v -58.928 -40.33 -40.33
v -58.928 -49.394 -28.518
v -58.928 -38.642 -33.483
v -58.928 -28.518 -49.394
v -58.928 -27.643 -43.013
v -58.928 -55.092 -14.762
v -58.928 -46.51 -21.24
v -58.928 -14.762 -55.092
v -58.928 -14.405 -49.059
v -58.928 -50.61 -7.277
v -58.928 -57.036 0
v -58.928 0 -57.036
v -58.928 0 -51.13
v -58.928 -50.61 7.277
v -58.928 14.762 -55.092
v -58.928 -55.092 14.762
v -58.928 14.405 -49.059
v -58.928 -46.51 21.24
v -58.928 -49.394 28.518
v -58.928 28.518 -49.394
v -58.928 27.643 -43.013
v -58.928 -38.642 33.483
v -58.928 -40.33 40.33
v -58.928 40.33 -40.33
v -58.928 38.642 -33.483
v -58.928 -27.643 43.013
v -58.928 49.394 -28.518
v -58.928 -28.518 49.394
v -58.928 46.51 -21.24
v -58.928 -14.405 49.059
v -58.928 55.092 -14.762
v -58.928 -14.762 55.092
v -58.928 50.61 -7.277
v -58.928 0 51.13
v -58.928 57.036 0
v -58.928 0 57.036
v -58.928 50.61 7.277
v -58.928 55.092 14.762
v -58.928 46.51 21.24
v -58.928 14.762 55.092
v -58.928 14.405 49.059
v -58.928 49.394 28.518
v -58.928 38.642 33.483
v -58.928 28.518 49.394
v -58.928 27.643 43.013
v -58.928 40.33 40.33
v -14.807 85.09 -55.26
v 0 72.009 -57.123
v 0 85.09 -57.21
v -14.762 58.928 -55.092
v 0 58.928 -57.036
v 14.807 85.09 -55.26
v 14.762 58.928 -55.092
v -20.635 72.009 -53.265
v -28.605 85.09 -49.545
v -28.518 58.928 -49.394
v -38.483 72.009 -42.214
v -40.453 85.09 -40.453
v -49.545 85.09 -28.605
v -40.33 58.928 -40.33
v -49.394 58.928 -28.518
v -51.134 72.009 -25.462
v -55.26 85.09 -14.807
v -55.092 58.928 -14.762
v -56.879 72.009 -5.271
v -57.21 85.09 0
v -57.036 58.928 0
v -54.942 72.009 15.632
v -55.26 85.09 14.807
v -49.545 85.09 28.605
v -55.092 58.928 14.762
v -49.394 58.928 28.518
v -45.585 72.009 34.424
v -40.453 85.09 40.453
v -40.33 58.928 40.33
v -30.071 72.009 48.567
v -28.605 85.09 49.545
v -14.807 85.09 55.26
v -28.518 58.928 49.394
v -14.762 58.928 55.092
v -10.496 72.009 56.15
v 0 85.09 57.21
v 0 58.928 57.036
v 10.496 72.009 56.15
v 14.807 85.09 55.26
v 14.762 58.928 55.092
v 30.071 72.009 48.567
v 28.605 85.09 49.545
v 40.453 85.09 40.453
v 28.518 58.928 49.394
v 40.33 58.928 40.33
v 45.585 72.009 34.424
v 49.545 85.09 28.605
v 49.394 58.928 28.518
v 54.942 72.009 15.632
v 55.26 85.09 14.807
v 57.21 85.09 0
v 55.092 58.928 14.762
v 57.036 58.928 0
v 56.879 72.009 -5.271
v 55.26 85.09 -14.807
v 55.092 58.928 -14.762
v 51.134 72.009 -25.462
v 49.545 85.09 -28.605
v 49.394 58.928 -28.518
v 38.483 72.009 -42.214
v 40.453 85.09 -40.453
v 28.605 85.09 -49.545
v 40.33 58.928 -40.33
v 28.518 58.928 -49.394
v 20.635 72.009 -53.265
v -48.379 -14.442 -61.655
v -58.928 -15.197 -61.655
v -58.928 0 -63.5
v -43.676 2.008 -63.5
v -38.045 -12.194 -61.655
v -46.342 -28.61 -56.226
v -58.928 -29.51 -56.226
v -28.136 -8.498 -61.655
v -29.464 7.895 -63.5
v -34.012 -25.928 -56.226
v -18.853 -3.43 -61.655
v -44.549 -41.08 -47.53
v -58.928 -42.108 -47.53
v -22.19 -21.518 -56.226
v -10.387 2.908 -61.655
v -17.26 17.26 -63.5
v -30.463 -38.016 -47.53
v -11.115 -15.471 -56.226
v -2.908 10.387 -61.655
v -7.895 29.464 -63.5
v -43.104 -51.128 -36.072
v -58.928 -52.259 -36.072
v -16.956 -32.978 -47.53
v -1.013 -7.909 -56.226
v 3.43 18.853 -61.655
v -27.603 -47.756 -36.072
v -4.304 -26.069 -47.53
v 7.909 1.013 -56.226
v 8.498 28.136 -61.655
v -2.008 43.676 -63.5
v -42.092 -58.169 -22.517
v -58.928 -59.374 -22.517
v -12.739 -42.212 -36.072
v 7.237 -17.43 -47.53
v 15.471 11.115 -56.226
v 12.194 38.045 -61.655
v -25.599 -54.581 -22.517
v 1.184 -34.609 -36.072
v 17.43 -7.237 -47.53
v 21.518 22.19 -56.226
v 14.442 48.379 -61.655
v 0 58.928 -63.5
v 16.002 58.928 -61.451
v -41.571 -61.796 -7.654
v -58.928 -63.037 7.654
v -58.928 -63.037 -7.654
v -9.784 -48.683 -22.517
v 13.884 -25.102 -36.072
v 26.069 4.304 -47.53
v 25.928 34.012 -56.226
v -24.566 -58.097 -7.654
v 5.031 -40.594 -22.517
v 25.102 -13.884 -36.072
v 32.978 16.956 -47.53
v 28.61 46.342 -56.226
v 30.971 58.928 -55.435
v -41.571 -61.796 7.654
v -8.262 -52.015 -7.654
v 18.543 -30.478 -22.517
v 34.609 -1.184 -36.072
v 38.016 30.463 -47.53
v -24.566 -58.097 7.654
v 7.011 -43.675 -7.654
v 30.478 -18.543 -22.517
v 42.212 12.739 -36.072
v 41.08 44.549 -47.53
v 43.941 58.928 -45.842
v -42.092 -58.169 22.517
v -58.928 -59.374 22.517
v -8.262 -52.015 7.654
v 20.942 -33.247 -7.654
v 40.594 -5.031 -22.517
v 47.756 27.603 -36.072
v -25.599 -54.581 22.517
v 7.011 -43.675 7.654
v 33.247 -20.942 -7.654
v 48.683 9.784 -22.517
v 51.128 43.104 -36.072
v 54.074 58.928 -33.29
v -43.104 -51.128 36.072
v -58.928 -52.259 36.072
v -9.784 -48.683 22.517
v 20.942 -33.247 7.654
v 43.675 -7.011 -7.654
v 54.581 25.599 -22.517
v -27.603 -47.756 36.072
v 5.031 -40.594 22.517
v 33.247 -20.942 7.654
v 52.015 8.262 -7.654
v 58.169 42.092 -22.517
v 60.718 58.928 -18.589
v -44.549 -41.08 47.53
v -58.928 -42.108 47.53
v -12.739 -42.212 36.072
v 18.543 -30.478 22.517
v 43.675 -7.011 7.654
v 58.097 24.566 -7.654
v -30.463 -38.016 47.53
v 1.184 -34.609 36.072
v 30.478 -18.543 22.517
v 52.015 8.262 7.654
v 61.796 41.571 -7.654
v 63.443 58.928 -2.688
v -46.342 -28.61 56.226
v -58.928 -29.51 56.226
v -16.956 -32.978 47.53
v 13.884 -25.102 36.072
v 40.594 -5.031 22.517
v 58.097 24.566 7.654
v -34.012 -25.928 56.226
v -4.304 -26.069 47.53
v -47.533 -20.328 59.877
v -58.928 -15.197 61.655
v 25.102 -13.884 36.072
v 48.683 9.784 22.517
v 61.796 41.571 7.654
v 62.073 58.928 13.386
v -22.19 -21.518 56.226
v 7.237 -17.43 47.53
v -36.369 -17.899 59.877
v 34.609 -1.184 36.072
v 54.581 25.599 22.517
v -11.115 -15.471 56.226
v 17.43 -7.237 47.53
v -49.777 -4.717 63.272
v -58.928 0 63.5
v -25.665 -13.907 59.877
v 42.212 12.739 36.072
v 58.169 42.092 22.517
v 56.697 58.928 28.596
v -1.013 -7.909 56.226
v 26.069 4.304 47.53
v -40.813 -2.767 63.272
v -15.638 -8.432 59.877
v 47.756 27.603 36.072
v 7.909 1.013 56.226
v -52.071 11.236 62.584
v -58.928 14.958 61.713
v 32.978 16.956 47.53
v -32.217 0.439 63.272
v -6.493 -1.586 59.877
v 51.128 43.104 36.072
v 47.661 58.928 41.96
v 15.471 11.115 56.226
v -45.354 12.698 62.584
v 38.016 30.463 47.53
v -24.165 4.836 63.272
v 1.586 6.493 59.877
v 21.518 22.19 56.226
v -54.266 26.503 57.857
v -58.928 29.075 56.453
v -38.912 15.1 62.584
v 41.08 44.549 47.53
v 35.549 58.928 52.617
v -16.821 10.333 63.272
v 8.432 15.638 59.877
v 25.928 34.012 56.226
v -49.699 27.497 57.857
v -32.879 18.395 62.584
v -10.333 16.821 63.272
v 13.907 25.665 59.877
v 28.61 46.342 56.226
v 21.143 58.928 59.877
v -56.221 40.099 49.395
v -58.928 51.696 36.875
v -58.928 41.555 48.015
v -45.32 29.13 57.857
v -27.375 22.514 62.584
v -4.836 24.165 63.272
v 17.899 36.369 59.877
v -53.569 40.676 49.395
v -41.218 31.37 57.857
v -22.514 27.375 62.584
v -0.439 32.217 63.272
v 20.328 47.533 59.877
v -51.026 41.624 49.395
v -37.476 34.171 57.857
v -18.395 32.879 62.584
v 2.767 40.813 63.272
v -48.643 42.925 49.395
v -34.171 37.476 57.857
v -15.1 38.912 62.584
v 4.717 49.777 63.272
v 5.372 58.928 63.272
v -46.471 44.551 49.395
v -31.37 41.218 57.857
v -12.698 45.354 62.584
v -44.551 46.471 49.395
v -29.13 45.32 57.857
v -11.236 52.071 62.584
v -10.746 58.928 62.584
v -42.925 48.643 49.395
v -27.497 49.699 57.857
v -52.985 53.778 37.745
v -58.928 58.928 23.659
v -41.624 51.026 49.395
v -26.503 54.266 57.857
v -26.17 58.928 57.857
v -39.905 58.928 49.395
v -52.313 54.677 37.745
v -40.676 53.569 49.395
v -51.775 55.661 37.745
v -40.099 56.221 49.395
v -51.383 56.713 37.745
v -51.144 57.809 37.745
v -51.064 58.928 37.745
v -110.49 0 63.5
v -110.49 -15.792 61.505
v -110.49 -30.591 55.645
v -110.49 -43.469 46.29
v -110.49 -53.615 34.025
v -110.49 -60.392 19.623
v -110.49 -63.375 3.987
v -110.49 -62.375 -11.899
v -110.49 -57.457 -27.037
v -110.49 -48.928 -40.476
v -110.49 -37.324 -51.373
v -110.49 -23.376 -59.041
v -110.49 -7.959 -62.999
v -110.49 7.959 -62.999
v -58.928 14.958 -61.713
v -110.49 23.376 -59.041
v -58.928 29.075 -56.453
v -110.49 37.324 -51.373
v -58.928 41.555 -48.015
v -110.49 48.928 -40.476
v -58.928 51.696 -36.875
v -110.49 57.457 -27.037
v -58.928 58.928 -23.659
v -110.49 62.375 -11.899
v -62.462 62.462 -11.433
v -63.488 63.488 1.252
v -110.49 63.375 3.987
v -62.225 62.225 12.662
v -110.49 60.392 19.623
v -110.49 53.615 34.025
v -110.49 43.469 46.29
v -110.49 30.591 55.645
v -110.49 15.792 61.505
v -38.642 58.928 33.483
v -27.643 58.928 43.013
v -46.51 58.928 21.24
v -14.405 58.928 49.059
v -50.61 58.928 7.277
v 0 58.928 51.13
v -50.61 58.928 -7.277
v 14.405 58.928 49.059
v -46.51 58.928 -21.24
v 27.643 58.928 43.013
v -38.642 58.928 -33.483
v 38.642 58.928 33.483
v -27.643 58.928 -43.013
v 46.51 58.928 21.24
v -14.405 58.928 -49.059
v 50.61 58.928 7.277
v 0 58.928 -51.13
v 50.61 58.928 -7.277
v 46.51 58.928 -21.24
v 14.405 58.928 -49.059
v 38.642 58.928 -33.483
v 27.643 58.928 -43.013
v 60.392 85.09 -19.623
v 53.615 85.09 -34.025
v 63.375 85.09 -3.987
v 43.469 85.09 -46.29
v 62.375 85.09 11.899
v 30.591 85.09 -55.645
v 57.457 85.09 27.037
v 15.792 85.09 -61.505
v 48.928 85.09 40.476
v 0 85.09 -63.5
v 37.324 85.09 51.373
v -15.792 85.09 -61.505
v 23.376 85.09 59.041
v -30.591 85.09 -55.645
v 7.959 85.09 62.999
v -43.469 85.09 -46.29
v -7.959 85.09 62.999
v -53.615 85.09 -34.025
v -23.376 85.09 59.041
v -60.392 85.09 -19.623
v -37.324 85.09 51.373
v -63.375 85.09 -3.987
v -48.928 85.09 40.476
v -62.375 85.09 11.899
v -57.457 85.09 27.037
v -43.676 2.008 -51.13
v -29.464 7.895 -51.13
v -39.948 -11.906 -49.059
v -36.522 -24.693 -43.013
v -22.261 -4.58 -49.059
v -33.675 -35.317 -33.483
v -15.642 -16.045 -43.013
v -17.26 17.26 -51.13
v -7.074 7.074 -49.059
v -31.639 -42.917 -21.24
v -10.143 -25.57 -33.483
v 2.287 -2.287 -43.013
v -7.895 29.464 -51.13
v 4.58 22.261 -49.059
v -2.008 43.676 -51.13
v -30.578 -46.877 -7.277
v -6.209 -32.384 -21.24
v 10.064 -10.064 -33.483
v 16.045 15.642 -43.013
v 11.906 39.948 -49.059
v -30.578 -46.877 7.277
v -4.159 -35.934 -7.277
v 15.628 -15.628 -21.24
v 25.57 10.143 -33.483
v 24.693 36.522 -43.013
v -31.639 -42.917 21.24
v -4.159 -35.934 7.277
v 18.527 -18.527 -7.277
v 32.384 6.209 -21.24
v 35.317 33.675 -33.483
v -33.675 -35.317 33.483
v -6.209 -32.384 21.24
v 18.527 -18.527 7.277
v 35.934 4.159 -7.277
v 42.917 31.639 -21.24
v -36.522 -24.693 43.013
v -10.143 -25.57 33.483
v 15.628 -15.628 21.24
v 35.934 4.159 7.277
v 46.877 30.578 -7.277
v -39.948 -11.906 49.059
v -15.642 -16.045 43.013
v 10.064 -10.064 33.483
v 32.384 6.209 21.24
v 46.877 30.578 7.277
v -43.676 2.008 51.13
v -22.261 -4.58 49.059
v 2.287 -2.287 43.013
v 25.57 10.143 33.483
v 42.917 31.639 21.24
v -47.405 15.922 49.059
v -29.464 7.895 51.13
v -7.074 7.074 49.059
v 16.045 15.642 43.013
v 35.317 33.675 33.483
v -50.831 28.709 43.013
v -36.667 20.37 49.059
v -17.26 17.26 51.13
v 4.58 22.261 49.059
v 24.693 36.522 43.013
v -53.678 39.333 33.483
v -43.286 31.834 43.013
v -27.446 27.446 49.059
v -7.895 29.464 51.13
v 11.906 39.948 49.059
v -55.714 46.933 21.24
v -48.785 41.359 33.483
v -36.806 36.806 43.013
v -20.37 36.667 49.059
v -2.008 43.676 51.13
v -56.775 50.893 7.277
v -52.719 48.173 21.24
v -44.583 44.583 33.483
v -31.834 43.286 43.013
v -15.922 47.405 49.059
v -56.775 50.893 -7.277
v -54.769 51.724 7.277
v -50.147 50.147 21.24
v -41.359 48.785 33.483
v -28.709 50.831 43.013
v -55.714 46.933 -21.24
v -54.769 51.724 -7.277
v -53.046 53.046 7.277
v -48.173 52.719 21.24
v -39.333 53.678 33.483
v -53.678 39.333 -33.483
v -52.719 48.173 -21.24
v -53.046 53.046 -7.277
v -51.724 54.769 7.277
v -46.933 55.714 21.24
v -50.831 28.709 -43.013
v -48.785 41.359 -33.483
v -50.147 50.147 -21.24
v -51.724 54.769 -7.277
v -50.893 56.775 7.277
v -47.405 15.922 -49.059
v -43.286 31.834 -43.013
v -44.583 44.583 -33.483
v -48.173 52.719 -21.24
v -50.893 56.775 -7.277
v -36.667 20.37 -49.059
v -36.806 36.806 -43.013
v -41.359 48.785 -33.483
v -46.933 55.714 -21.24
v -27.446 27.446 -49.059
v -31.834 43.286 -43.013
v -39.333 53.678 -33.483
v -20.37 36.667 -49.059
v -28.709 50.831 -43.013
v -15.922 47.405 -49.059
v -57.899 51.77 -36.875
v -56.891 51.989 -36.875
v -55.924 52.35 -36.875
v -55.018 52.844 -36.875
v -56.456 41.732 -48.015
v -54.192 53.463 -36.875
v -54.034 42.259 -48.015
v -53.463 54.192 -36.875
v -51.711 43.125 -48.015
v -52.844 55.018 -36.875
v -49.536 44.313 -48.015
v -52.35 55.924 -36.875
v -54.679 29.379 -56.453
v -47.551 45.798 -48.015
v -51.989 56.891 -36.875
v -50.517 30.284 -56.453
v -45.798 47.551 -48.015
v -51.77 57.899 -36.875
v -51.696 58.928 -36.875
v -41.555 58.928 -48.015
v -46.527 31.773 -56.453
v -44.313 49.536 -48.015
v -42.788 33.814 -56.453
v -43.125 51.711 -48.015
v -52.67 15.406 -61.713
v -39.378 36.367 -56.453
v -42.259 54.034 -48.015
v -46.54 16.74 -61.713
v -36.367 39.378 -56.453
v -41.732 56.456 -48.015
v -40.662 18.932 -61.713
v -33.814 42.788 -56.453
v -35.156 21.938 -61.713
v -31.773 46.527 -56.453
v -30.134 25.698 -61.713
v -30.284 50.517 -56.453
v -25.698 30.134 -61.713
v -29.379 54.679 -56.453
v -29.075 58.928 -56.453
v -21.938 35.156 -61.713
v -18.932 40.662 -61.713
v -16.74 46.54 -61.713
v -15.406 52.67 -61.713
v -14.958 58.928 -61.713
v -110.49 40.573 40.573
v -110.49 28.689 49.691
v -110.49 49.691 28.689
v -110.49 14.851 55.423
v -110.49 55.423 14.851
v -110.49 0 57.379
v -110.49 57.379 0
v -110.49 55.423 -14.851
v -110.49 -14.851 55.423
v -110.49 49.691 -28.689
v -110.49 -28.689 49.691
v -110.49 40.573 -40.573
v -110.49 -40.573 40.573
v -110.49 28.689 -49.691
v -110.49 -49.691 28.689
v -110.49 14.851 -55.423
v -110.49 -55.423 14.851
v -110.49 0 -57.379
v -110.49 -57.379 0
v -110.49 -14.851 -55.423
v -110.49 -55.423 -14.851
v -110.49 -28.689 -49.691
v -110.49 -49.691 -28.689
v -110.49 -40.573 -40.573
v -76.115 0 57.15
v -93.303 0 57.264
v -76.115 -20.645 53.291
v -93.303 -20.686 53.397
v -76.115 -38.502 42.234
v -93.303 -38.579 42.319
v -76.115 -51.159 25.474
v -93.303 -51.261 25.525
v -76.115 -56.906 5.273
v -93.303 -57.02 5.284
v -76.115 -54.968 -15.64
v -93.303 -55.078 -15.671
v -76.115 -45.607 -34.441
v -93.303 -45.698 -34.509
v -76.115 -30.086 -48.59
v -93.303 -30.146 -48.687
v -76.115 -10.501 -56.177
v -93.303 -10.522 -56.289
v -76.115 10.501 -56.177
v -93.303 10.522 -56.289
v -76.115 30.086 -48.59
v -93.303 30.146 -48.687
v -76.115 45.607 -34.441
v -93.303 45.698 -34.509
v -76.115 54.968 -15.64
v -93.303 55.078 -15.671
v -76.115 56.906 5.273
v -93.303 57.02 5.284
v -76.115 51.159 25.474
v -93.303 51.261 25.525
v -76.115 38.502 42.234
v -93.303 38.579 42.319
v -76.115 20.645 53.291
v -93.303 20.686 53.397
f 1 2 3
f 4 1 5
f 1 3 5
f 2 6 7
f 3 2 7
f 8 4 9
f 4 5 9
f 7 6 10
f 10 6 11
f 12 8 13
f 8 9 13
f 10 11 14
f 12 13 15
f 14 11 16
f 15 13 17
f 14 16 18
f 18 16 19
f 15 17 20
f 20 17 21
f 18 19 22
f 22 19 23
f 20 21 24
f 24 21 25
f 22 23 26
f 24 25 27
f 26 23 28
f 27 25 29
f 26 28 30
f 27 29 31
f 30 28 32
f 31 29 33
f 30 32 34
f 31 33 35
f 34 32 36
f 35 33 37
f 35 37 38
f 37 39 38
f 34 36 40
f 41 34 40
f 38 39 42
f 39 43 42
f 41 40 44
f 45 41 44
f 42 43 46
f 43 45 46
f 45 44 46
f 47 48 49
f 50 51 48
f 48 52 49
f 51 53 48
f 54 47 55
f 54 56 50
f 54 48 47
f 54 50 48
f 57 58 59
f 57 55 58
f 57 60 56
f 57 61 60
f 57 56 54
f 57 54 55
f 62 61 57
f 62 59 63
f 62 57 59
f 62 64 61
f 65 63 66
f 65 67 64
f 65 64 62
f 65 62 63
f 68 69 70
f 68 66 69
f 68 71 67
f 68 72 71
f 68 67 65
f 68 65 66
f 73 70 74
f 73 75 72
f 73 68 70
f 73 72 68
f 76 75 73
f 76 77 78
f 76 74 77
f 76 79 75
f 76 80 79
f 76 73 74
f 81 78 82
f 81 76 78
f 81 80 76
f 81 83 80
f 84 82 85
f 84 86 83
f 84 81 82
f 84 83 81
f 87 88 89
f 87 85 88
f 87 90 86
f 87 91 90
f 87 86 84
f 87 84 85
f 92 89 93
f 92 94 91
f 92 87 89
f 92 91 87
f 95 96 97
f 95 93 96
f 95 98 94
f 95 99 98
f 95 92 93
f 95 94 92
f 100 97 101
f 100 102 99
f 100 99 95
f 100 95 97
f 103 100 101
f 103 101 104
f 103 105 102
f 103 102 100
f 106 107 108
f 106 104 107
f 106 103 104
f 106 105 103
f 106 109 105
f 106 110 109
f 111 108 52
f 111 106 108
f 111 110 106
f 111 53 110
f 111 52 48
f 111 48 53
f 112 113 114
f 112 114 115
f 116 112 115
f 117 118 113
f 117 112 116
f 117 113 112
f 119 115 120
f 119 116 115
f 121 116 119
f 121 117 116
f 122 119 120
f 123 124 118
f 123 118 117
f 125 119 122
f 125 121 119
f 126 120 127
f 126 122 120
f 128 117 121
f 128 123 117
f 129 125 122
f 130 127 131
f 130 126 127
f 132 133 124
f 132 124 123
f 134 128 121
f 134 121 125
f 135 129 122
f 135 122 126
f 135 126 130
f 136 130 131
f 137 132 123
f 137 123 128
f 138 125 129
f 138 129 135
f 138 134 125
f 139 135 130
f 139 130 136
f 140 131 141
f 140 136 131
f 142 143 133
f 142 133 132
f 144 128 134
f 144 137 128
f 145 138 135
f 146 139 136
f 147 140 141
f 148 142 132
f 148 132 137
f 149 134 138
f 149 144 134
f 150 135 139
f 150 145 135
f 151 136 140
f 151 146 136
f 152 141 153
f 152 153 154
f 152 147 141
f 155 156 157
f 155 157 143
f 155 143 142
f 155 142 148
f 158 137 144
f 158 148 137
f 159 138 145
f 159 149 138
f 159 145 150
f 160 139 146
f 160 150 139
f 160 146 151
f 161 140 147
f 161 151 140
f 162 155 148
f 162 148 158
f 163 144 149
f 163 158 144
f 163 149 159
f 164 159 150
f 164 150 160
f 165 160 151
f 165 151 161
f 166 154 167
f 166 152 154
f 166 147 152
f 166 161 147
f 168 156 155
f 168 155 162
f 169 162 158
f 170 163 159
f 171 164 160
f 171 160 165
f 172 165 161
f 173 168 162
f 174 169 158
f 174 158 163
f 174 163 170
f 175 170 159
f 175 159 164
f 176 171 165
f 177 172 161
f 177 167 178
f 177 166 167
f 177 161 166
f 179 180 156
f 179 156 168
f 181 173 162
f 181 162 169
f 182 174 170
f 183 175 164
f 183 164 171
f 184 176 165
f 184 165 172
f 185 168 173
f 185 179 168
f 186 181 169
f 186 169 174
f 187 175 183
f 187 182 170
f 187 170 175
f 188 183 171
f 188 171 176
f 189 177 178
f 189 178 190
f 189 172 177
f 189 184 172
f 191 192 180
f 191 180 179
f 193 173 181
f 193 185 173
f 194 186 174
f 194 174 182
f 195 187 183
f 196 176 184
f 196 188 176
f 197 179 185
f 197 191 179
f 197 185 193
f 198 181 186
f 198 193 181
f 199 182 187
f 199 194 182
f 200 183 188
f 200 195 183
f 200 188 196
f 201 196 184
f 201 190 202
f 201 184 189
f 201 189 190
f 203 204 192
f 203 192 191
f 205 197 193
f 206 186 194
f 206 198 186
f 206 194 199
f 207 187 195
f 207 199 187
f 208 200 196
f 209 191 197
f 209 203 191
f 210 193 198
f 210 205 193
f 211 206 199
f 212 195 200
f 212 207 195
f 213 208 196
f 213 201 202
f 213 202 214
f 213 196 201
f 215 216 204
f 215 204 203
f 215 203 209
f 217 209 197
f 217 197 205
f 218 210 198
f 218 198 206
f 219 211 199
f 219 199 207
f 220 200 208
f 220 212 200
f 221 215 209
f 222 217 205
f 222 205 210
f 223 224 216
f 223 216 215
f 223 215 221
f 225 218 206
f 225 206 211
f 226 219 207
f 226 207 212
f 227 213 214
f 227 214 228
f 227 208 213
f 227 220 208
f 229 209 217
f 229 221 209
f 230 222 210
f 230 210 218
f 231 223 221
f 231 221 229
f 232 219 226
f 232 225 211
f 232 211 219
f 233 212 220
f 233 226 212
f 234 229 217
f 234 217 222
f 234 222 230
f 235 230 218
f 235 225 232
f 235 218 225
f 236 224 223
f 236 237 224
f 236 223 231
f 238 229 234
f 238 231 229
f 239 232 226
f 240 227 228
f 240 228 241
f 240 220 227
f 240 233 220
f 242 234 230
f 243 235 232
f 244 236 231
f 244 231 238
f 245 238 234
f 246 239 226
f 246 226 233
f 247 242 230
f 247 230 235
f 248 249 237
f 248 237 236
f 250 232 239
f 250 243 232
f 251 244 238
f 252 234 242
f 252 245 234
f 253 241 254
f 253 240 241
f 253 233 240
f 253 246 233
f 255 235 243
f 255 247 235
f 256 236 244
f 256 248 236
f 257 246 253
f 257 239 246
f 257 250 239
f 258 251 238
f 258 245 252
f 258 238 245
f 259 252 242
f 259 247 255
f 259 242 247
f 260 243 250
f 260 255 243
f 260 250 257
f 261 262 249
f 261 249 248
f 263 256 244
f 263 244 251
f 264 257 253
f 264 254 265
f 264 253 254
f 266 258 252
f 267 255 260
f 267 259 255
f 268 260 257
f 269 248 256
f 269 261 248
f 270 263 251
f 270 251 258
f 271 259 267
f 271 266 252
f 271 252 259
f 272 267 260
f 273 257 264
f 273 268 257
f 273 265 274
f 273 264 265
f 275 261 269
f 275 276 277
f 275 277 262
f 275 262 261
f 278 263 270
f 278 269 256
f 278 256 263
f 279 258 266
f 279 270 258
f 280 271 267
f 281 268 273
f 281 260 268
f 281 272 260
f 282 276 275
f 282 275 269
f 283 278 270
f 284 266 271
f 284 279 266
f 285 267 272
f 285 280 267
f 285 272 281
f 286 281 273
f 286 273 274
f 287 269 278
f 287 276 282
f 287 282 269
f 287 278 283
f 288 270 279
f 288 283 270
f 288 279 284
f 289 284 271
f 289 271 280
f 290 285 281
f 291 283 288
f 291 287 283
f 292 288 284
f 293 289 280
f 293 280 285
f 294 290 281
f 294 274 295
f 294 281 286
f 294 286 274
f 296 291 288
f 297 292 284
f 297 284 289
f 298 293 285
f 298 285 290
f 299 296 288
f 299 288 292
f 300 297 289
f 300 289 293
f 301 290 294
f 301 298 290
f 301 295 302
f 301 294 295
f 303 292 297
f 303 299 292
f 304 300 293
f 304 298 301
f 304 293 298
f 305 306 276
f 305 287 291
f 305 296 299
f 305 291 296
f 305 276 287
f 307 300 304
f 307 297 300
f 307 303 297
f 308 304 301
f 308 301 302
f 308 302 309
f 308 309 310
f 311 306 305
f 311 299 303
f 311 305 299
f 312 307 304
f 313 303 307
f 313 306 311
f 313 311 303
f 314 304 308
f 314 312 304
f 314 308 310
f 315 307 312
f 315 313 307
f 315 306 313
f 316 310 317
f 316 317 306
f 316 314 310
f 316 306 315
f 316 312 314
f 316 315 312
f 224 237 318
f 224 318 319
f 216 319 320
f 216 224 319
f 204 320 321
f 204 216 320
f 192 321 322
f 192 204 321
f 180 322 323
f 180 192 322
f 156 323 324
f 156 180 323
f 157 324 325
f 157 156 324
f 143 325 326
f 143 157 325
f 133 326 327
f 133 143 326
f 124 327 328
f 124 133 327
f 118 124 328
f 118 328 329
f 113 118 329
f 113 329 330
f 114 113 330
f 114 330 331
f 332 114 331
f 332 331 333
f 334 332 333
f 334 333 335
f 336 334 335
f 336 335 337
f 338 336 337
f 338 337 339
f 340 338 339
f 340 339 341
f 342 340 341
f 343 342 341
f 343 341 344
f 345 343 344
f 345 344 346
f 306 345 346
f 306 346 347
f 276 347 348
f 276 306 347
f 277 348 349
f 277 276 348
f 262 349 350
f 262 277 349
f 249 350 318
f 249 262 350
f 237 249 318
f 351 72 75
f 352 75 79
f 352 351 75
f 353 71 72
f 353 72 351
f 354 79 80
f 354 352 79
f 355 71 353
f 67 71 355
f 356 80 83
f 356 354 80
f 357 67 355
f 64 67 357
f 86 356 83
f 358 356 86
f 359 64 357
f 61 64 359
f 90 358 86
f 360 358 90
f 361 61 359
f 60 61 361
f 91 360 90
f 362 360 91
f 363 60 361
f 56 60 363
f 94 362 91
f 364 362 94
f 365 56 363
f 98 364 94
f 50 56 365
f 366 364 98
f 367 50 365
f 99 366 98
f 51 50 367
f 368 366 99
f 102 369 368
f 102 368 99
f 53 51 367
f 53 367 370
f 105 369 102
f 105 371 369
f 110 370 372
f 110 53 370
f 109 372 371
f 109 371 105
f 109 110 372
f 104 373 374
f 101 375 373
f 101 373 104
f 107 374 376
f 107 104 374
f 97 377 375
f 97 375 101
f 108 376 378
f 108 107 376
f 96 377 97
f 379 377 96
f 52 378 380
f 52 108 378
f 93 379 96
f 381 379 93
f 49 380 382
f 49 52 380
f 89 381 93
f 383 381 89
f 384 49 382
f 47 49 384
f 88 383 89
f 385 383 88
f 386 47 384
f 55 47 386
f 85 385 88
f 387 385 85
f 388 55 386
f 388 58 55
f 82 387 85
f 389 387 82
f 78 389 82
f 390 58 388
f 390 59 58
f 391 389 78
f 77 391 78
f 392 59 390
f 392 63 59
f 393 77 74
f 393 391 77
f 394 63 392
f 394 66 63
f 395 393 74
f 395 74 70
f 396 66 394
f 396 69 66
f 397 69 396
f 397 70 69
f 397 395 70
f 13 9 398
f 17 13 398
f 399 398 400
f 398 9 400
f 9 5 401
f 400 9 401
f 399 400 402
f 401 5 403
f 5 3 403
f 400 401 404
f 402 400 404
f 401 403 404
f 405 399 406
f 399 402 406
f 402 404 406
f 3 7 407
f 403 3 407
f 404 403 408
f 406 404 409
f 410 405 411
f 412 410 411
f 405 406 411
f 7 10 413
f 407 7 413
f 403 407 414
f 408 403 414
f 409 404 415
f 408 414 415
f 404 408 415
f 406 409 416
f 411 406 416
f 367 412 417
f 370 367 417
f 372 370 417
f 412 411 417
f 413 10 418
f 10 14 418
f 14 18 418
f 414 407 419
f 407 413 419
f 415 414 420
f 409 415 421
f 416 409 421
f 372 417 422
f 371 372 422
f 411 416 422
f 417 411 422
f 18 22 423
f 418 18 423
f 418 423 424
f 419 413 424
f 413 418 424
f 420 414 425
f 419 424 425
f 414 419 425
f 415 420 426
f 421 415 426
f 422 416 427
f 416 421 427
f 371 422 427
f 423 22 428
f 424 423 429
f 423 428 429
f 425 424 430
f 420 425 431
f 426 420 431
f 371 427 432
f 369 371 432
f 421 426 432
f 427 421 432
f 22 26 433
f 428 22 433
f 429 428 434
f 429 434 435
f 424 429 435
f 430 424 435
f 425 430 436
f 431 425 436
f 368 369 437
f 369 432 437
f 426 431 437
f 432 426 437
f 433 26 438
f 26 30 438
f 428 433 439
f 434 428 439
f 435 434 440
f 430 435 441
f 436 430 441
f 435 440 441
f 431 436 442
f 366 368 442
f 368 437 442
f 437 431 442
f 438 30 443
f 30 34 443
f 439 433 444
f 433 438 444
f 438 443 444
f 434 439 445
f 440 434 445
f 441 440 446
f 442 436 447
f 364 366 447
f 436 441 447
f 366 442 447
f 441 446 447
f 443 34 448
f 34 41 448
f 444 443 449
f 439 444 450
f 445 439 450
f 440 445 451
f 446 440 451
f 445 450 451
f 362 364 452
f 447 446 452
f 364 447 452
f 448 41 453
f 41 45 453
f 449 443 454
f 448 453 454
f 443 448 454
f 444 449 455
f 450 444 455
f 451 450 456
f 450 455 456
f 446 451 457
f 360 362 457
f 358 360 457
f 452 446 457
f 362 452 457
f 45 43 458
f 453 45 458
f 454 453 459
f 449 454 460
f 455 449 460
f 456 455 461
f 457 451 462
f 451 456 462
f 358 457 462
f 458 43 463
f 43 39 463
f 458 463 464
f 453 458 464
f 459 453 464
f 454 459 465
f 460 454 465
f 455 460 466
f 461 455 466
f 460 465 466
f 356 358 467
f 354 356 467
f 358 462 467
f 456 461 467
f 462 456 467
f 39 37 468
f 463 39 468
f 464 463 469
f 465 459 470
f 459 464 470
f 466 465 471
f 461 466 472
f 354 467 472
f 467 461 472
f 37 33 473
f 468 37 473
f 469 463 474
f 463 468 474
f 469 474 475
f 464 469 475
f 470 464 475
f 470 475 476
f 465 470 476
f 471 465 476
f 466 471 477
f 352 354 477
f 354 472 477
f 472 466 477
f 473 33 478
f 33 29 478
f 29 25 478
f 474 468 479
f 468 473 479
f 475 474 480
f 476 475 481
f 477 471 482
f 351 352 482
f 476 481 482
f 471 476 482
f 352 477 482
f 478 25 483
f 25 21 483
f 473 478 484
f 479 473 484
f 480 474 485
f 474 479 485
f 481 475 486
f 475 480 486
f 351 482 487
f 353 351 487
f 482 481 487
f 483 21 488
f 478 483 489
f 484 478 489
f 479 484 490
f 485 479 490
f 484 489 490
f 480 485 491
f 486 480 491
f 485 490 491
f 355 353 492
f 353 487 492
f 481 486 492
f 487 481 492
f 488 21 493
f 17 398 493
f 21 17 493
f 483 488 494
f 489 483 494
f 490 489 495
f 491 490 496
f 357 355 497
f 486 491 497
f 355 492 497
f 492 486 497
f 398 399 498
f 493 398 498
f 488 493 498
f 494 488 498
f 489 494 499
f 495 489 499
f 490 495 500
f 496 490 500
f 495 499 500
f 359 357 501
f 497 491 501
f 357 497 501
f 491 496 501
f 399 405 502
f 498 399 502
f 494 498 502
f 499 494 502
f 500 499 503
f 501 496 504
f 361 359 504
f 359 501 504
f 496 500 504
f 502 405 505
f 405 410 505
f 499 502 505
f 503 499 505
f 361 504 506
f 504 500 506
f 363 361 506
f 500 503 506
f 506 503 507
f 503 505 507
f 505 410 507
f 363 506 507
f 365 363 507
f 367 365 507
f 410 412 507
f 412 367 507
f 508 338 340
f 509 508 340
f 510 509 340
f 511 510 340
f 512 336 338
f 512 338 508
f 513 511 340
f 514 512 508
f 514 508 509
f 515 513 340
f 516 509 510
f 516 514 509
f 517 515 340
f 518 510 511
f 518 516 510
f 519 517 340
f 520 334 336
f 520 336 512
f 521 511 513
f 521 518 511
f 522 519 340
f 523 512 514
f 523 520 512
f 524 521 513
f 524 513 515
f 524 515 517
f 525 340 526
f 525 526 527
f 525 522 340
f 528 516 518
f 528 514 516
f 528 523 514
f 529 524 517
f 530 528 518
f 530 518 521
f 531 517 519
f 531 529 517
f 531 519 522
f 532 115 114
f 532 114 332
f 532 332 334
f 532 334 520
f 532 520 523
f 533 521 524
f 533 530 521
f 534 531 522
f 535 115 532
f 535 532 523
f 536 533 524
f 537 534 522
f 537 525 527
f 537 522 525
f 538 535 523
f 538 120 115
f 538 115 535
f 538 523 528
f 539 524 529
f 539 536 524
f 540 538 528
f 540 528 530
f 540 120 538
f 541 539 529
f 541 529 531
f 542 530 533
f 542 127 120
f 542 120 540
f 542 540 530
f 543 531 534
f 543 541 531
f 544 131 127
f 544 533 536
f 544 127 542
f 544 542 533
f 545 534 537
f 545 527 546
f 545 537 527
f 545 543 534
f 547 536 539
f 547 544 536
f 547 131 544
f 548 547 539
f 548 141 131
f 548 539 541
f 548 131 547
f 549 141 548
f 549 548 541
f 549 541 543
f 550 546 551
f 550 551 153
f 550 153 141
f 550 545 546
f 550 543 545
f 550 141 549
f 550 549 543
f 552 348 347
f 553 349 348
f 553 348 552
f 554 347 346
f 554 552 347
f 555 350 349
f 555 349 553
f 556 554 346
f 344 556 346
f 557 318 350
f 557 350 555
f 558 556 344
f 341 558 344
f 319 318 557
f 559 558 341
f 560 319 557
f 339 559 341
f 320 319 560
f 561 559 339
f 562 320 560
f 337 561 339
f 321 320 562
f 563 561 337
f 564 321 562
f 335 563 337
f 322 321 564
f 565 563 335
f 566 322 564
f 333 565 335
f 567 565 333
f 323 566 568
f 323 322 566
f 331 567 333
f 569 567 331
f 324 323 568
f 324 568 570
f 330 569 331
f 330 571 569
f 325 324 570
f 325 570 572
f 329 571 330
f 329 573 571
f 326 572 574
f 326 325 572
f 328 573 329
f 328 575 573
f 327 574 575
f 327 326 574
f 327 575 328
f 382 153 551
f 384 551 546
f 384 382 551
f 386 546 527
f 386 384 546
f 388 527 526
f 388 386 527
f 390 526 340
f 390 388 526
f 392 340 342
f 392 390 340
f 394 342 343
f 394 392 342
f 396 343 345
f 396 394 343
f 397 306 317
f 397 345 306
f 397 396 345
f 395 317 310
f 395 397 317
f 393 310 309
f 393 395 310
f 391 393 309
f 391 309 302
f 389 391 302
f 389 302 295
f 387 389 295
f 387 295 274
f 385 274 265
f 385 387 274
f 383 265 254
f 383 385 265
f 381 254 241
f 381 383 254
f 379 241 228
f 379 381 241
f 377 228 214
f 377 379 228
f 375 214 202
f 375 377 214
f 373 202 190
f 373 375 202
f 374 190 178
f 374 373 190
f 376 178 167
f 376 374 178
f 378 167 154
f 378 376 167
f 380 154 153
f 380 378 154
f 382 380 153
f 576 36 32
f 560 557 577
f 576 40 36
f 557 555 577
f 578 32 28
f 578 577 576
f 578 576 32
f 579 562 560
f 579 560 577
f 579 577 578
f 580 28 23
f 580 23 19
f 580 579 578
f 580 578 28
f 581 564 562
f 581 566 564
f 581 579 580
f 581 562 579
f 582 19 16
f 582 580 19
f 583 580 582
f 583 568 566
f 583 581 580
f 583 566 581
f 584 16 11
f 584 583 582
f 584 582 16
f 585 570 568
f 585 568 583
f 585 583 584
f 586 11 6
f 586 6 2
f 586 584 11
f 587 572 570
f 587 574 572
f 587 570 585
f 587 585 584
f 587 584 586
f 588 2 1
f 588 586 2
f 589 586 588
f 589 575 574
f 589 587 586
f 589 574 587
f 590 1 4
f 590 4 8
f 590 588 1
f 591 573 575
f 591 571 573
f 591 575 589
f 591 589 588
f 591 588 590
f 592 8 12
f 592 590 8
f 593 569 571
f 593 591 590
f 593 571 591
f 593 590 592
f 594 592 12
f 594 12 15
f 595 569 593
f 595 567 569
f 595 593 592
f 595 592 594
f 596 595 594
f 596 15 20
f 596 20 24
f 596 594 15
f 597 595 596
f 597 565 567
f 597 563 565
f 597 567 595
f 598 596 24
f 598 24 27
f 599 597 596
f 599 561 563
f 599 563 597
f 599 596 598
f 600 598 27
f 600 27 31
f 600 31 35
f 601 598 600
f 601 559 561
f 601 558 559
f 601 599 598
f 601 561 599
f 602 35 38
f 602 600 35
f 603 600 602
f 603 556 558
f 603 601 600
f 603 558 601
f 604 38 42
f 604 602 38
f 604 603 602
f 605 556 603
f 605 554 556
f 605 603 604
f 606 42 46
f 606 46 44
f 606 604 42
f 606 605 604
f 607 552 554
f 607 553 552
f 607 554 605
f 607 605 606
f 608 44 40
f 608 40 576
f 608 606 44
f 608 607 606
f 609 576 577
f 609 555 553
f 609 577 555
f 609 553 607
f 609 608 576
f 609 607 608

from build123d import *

# Parameters (mm, degrees)
SKETCH3_R          = 63.5
SKETCH3_R_2        = 51.1302
SKETCH5_R          = 63.5
SKETCH5_R_2        = 42.73738
CUT_EXTRUDE1_DEPTH = 25.4


with BuildPart() as part:
    # Sketch1 → Revolve1 (revolve)
    with BuildSketch(Plane.XY):
        Polygon((-110.49, -63.5), (-58.928, -63.5), (-58.928, -57.0357), (-110.49, -57.3786), align=None)
    revolve(axis=Axis((-110.49, 0, 0), (1, 0, 0)))


with BuildPart() as body_2:
    # Sketch2 → Revolve2 (revolve)
    with BuildSketch(Plane.XY):
        Polygon((57.3786, 110.49), (57.0357, 58.928), (63.5, 58.928), (63.5, 110.49), align=None)
    revolve(axis=Axis((0, 0, 0), (0, 1, 0)))


with BuildPart() as sweep1_tool:
    # Sweep1: sweep along a path in Sketch4
    with BuildLine(Plane.XY) as sweep1_path:
        ThreePointArc((-58.928, 0), (-17.259612, 17.259612), (0, 58.928))
    # Sketch3 → Sweep1 (sweep)
    with BuildSketch(Plane(origin=(-58.928, 0, 0), x_dir=(0, 0, -1), z_dir=(1, 0, 0))):
        Circle(SKETCH3_R)
        Circle(SKETCH3_R_2, mode=Mode.SUBTRACT)
    sweep(path=sweep1_path.line)


with BuildPart() as part_1:
    add(part.part)


with BuildPart() as part_2:
    # Sweep1: joined with sweep1_tool
    add(part_1.part.fuse(sweep1_tool.part, body_2.part, tol=0.00001))

    # Sketch5 → Cut-Extrude1 (cut)
    with BuildSketch(Plane(origin=(0, 110.49, 0), x_dir=(1, 0, 0), z_dir=(0, 1, 0))):
        Circle(SKETCH5_R)
        Circle(SKETCH5_R_2, mode=Mode.SUBTRACT)
    extrude(amount=-CUT_EXTRUDE1_DEPTH, mode=Mode.SUBTRACT)


solid = part_2.part
